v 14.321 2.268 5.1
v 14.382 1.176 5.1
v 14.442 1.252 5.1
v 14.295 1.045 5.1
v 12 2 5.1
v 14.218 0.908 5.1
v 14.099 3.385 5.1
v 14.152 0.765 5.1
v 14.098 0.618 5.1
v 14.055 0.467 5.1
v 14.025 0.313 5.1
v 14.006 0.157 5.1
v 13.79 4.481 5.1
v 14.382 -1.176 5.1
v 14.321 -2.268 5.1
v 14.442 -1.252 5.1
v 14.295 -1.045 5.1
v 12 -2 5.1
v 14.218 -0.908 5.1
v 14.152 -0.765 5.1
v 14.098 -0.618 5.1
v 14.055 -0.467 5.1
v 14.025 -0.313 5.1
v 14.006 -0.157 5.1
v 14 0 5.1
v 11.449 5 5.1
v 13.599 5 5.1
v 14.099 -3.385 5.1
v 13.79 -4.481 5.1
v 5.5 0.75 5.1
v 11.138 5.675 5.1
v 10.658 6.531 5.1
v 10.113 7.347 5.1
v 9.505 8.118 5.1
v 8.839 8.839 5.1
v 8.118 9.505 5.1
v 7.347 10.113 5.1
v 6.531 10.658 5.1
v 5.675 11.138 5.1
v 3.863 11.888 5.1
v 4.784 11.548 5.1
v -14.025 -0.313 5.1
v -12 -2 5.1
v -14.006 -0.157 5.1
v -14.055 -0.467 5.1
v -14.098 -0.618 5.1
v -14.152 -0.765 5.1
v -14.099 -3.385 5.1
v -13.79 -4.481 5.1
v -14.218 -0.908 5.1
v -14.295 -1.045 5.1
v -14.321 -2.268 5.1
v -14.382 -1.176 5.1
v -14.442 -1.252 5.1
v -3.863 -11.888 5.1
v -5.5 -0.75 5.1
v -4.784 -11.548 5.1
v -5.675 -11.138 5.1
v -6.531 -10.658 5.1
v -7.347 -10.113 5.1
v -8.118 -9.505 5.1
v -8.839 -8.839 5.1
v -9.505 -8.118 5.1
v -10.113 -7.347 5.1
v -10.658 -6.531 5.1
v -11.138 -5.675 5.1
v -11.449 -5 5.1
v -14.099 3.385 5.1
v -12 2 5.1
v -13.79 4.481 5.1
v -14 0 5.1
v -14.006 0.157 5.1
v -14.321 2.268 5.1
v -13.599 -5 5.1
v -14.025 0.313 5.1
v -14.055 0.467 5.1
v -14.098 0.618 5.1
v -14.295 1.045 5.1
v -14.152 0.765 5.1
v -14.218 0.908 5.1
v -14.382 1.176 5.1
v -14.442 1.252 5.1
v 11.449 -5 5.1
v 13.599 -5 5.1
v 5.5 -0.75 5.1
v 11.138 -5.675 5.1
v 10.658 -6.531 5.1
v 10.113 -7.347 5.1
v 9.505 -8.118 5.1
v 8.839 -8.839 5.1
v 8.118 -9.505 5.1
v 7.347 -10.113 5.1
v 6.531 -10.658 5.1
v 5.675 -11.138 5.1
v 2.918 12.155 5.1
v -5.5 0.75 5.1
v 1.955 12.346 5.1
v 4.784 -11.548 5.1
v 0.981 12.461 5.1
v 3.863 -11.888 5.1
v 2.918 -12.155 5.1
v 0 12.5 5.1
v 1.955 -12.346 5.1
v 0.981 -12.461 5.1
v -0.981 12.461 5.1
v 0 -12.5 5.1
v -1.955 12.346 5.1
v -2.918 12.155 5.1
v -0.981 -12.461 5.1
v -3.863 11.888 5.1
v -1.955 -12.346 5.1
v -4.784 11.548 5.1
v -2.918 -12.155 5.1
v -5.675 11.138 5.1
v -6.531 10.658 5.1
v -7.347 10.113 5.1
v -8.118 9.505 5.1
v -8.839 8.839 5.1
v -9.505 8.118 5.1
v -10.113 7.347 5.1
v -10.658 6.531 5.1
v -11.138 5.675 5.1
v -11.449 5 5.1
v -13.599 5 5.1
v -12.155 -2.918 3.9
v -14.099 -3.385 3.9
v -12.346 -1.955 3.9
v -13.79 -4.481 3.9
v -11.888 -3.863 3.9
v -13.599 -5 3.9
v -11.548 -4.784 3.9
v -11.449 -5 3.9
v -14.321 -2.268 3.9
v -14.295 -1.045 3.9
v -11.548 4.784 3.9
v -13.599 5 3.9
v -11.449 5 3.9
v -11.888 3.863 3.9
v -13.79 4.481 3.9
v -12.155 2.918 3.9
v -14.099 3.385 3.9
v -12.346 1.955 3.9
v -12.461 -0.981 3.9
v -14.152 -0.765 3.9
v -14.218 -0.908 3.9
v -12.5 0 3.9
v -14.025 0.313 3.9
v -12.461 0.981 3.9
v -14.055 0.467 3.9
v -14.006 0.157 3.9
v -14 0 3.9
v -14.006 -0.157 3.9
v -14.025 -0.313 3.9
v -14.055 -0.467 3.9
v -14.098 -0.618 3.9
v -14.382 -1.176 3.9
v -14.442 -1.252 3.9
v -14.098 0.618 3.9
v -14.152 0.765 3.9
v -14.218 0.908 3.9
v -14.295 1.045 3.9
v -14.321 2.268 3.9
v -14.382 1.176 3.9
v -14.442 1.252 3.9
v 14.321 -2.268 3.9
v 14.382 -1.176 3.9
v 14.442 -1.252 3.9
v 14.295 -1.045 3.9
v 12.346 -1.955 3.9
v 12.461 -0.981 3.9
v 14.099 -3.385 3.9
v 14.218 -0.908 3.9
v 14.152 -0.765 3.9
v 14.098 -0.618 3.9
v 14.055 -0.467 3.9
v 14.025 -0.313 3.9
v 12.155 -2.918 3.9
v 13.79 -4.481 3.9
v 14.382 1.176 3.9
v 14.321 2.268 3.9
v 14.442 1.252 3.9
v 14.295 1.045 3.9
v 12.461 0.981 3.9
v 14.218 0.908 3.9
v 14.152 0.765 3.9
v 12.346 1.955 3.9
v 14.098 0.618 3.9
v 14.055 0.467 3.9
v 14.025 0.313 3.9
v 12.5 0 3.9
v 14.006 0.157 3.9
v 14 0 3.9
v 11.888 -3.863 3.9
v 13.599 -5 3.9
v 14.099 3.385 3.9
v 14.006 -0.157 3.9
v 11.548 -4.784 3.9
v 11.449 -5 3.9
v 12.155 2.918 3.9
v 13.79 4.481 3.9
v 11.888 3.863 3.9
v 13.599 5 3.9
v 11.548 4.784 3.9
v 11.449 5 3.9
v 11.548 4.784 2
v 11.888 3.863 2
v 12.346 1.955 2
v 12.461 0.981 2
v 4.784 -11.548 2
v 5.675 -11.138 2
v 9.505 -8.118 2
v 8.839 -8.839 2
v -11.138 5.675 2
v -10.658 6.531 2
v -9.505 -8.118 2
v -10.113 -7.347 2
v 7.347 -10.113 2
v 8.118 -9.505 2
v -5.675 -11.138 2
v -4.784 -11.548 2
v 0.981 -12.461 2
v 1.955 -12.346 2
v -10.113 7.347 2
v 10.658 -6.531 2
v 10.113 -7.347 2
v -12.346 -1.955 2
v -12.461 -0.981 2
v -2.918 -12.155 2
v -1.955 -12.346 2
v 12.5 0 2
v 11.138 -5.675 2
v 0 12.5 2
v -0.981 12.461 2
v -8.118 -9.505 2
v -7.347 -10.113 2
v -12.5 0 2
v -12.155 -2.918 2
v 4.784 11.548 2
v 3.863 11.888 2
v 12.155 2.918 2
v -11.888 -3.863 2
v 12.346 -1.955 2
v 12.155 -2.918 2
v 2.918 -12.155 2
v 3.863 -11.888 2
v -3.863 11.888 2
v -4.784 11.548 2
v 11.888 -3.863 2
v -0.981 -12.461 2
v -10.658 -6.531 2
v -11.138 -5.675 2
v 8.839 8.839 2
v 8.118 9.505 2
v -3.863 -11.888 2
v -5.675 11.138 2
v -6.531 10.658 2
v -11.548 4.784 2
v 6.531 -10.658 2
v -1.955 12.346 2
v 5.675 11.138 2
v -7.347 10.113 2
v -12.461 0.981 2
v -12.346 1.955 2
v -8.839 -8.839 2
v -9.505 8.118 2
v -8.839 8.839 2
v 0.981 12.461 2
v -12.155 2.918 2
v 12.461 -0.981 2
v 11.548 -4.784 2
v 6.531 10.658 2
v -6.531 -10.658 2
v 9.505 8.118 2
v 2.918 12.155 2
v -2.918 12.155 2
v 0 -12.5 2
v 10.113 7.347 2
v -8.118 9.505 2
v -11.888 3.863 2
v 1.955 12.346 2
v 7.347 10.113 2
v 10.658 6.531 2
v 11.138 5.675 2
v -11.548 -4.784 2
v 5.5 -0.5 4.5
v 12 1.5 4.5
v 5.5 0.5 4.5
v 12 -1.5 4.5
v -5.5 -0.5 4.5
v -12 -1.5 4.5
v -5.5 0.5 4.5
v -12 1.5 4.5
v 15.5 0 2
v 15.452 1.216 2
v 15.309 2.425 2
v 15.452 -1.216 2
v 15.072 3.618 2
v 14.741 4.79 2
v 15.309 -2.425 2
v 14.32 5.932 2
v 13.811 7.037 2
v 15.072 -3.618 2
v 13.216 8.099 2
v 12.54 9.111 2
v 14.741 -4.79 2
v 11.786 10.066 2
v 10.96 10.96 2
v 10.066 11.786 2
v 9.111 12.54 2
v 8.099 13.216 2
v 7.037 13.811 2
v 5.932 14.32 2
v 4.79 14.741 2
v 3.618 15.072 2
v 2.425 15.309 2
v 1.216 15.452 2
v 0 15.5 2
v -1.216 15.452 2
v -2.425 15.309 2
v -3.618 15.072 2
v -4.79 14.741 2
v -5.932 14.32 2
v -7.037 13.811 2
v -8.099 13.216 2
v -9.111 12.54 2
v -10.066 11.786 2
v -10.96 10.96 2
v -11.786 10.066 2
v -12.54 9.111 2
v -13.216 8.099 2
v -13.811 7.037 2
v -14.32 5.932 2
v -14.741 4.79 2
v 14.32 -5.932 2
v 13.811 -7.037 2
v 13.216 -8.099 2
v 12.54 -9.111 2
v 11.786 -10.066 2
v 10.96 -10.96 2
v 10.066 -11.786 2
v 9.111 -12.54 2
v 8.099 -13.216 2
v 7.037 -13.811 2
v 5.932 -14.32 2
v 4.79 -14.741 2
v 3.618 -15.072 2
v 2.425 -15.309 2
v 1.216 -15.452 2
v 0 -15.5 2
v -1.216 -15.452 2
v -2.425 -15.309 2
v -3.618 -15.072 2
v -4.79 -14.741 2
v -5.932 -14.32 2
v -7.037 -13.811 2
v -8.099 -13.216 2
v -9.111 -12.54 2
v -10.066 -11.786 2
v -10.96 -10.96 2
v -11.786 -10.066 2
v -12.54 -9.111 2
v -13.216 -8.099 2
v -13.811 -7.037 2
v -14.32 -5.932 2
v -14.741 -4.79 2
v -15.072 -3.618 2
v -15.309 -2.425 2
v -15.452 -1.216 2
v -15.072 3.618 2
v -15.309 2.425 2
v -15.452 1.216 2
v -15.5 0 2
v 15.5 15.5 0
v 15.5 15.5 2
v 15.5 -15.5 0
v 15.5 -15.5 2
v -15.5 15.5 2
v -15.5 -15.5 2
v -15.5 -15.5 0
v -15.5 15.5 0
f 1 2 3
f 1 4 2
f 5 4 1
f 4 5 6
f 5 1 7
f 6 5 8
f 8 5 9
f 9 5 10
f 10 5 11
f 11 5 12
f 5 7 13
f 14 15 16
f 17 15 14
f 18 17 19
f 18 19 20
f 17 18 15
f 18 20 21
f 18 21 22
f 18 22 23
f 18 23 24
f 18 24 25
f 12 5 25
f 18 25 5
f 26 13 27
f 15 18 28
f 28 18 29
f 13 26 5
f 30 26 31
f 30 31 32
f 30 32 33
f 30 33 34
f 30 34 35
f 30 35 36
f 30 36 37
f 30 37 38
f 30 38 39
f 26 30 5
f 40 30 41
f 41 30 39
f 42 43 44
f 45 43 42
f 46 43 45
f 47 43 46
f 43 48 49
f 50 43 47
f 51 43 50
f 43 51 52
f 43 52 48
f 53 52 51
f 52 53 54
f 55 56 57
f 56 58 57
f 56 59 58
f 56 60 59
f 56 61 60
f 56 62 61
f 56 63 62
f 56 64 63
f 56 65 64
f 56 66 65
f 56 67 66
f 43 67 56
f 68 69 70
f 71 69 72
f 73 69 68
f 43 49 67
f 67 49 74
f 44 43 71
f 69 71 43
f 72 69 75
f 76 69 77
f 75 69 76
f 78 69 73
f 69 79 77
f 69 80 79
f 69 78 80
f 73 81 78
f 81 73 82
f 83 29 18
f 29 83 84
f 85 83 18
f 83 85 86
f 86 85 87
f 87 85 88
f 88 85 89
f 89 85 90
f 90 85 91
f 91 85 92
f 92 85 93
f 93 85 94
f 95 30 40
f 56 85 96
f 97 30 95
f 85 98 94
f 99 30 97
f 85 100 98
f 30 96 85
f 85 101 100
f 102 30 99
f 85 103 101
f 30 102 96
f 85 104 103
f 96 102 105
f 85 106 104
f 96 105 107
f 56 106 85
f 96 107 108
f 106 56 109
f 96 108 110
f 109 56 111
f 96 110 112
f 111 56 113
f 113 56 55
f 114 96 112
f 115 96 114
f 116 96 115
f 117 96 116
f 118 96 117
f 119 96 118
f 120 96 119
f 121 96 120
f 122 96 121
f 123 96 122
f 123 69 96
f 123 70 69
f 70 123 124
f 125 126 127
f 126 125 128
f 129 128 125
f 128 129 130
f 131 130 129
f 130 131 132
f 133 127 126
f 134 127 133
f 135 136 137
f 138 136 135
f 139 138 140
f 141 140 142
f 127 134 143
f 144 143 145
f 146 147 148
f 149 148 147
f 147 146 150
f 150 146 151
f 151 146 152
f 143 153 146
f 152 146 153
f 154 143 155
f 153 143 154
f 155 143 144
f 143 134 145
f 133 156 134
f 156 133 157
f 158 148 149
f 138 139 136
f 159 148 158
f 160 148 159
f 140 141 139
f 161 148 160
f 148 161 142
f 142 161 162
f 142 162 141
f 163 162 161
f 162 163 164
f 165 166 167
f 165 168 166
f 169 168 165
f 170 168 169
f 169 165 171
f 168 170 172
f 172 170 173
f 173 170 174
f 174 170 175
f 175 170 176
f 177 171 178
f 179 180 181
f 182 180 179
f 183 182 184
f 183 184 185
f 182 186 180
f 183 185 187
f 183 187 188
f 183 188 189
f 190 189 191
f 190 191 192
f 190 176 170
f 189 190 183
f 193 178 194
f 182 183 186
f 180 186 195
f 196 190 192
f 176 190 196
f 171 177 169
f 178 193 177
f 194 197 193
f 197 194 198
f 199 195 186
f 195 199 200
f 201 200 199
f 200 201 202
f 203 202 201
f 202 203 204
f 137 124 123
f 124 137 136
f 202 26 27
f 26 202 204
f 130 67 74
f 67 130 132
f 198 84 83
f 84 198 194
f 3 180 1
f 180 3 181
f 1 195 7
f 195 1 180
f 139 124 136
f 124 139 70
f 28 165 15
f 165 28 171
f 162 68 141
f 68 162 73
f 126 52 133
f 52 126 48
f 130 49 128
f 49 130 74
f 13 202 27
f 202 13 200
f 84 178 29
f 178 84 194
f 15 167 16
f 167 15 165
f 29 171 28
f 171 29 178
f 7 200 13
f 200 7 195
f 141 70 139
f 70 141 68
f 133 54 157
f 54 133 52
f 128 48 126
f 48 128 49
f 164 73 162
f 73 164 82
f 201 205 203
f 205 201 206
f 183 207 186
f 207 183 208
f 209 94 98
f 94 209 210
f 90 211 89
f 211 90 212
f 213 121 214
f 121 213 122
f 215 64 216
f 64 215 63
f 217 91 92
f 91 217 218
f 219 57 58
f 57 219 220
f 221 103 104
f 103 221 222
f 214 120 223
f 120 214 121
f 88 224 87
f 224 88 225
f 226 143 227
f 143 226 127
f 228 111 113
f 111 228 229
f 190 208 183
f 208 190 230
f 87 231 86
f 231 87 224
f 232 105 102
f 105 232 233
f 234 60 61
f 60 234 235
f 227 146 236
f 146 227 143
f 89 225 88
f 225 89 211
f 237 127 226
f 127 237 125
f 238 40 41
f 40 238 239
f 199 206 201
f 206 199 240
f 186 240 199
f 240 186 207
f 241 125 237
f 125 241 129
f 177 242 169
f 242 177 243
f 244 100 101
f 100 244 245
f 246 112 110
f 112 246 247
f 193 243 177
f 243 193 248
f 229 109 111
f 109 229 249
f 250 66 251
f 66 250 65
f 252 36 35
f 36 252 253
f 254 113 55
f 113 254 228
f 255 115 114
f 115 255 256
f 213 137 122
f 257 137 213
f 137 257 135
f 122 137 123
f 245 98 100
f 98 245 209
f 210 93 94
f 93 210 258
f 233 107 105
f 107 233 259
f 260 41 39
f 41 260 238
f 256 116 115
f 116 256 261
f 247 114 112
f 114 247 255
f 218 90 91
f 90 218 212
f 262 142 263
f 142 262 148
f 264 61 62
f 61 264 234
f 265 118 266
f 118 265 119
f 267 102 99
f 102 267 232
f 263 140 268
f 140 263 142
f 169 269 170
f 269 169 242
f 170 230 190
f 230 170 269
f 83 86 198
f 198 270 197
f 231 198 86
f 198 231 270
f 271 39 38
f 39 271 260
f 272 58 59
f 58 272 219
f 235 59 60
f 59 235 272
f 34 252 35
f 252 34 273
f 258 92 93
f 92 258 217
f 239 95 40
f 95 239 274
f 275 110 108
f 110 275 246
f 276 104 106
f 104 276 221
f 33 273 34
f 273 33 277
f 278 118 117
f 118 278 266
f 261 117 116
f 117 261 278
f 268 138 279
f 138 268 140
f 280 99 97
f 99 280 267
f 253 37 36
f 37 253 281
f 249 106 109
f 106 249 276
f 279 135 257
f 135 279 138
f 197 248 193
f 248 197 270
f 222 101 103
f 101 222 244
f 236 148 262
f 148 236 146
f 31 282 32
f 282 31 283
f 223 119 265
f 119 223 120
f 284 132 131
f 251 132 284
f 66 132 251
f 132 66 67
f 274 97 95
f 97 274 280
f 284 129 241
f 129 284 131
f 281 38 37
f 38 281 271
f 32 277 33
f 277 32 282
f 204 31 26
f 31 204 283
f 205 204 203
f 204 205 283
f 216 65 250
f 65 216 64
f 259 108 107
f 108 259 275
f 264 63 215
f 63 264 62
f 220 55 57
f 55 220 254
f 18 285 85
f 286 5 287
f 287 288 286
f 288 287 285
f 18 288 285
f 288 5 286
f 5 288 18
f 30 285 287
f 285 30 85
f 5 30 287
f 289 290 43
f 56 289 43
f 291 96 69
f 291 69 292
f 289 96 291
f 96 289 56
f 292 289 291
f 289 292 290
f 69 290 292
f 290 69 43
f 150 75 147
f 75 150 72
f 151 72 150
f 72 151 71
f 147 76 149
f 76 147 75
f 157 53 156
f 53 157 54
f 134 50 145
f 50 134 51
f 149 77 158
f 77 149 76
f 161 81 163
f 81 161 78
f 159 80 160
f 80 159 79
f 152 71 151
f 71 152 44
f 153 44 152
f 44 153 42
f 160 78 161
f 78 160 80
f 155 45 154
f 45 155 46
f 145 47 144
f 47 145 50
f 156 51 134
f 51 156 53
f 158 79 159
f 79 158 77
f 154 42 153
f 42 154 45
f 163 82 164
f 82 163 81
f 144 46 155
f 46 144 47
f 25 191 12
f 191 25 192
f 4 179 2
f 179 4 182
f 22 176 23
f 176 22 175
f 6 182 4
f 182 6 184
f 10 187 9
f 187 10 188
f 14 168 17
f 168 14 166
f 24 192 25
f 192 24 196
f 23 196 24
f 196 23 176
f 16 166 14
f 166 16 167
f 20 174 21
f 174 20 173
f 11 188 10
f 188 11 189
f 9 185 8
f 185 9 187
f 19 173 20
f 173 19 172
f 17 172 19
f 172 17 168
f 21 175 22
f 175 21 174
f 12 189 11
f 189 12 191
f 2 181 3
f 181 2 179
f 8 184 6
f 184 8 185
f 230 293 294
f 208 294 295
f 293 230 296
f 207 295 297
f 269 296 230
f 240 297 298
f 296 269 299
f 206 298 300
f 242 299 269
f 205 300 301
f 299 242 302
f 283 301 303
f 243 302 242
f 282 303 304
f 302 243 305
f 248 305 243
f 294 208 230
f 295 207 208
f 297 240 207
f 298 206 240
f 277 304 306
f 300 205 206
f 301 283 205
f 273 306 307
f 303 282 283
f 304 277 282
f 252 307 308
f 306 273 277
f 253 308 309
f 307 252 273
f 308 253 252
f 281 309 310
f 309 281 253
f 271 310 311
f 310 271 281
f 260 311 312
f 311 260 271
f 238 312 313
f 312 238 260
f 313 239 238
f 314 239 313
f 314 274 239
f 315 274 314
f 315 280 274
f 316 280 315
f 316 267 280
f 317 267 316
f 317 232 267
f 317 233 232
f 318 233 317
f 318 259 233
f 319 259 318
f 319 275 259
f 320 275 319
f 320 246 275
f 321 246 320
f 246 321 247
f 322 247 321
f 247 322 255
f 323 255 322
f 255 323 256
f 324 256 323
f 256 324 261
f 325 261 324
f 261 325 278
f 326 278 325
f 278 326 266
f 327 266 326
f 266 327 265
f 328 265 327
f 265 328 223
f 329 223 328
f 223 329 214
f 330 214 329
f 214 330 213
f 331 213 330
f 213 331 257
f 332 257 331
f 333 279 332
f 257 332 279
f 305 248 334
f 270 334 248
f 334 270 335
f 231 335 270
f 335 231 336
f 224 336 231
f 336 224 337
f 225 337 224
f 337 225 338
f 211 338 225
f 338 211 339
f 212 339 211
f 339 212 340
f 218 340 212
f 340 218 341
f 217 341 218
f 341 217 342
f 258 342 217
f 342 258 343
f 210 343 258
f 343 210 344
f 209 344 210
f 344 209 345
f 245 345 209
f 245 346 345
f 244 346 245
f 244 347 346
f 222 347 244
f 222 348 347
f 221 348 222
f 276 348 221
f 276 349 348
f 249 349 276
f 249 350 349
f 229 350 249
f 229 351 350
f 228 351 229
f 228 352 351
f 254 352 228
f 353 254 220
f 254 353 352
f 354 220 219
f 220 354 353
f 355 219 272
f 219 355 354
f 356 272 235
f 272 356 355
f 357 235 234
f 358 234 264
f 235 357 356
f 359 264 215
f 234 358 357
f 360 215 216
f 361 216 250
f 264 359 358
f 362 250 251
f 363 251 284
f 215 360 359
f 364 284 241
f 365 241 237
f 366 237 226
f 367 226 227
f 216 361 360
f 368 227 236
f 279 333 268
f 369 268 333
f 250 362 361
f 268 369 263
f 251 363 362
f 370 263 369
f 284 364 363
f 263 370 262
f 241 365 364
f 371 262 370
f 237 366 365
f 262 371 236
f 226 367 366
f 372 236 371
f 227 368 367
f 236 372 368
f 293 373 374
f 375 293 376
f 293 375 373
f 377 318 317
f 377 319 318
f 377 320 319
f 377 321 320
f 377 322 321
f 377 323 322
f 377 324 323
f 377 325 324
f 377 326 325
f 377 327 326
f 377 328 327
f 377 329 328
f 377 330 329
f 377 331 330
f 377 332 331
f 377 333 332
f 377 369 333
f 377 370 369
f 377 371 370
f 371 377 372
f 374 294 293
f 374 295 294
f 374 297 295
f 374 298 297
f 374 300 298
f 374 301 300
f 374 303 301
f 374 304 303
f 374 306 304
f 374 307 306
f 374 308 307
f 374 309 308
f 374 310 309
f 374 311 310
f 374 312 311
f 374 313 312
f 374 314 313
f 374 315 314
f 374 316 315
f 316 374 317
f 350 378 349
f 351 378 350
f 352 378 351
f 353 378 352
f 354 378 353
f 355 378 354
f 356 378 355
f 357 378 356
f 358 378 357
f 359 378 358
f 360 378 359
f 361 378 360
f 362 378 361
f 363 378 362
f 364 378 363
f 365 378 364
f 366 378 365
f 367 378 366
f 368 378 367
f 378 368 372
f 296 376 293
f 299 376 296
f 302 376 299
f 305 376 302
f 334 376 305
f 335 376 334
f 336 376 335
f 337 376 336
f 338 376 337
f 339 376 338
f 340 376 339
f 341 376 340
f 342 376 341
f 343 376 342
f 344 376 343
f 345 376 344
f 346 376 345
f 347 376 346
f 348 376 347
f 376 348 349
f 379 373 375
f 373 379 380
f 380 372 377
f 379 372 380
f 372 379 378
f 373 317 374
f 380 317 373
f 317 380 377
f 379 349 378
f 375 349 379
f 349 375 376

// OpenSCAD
// found this source on thingiverse
// https://www.thingiverse.com/thing:5001806/files
//
// Other link (but only stl files found)
// From ReallyBigTeeth this Garmin Edge & Forerunner aerobar mount
// https://www.thingiverse.com/thing:292539/files
//
// And from mitko_flash this garmin stem mount
// https://www.thingiverse.com/thing:3662119/files

module rast(lr=1,c=0.2,h=0.8){
    //cutouts in top
    hull(){
        translate([0,0,1.5-h])linear_extrude(.05) polygon([[lr*(12),1.5],[lr*5.5,0.5],[lr*5.5,-0.5],[lr*(12),-1.5]]);
        translate([0,0,1.5])linear_extrude(.05) polygon([[lr*(12),1.5+c],[lr*5.5,0.5+c/2],[lr*5.5,-0.5-c/2],[lr*(12),-1.5-c]]);
    }
}

$fn=80;


module mount(){
  translate([0,0,3.6]){
    translate([0,0,-3.6])linear_extrude(2){circle(d=31,center=true);}
    difference()
      {
      union(){ // upper part with brakets
        translate([0,0,-3.5])linear_extrude(5)circle(d=25,center=true);
        intersection() {
          translate([0,0,0.9])cube([35,10,1.2],center=true);
          cylinder(h=30,d=29,center=true);
        }
      }
      rast(1,0.5,.6);
      rast(-1,0.5,.6);
      translate([-16,0,0])cylinder(d=4,h=20,center=true); // circular cutout on edge
      translate([16,0,0])cylinder(d=4,h=20,center=true); // other edge
    }
  }
}

mount();
translate([0,0,1])cube([31,31,2],center=true);
